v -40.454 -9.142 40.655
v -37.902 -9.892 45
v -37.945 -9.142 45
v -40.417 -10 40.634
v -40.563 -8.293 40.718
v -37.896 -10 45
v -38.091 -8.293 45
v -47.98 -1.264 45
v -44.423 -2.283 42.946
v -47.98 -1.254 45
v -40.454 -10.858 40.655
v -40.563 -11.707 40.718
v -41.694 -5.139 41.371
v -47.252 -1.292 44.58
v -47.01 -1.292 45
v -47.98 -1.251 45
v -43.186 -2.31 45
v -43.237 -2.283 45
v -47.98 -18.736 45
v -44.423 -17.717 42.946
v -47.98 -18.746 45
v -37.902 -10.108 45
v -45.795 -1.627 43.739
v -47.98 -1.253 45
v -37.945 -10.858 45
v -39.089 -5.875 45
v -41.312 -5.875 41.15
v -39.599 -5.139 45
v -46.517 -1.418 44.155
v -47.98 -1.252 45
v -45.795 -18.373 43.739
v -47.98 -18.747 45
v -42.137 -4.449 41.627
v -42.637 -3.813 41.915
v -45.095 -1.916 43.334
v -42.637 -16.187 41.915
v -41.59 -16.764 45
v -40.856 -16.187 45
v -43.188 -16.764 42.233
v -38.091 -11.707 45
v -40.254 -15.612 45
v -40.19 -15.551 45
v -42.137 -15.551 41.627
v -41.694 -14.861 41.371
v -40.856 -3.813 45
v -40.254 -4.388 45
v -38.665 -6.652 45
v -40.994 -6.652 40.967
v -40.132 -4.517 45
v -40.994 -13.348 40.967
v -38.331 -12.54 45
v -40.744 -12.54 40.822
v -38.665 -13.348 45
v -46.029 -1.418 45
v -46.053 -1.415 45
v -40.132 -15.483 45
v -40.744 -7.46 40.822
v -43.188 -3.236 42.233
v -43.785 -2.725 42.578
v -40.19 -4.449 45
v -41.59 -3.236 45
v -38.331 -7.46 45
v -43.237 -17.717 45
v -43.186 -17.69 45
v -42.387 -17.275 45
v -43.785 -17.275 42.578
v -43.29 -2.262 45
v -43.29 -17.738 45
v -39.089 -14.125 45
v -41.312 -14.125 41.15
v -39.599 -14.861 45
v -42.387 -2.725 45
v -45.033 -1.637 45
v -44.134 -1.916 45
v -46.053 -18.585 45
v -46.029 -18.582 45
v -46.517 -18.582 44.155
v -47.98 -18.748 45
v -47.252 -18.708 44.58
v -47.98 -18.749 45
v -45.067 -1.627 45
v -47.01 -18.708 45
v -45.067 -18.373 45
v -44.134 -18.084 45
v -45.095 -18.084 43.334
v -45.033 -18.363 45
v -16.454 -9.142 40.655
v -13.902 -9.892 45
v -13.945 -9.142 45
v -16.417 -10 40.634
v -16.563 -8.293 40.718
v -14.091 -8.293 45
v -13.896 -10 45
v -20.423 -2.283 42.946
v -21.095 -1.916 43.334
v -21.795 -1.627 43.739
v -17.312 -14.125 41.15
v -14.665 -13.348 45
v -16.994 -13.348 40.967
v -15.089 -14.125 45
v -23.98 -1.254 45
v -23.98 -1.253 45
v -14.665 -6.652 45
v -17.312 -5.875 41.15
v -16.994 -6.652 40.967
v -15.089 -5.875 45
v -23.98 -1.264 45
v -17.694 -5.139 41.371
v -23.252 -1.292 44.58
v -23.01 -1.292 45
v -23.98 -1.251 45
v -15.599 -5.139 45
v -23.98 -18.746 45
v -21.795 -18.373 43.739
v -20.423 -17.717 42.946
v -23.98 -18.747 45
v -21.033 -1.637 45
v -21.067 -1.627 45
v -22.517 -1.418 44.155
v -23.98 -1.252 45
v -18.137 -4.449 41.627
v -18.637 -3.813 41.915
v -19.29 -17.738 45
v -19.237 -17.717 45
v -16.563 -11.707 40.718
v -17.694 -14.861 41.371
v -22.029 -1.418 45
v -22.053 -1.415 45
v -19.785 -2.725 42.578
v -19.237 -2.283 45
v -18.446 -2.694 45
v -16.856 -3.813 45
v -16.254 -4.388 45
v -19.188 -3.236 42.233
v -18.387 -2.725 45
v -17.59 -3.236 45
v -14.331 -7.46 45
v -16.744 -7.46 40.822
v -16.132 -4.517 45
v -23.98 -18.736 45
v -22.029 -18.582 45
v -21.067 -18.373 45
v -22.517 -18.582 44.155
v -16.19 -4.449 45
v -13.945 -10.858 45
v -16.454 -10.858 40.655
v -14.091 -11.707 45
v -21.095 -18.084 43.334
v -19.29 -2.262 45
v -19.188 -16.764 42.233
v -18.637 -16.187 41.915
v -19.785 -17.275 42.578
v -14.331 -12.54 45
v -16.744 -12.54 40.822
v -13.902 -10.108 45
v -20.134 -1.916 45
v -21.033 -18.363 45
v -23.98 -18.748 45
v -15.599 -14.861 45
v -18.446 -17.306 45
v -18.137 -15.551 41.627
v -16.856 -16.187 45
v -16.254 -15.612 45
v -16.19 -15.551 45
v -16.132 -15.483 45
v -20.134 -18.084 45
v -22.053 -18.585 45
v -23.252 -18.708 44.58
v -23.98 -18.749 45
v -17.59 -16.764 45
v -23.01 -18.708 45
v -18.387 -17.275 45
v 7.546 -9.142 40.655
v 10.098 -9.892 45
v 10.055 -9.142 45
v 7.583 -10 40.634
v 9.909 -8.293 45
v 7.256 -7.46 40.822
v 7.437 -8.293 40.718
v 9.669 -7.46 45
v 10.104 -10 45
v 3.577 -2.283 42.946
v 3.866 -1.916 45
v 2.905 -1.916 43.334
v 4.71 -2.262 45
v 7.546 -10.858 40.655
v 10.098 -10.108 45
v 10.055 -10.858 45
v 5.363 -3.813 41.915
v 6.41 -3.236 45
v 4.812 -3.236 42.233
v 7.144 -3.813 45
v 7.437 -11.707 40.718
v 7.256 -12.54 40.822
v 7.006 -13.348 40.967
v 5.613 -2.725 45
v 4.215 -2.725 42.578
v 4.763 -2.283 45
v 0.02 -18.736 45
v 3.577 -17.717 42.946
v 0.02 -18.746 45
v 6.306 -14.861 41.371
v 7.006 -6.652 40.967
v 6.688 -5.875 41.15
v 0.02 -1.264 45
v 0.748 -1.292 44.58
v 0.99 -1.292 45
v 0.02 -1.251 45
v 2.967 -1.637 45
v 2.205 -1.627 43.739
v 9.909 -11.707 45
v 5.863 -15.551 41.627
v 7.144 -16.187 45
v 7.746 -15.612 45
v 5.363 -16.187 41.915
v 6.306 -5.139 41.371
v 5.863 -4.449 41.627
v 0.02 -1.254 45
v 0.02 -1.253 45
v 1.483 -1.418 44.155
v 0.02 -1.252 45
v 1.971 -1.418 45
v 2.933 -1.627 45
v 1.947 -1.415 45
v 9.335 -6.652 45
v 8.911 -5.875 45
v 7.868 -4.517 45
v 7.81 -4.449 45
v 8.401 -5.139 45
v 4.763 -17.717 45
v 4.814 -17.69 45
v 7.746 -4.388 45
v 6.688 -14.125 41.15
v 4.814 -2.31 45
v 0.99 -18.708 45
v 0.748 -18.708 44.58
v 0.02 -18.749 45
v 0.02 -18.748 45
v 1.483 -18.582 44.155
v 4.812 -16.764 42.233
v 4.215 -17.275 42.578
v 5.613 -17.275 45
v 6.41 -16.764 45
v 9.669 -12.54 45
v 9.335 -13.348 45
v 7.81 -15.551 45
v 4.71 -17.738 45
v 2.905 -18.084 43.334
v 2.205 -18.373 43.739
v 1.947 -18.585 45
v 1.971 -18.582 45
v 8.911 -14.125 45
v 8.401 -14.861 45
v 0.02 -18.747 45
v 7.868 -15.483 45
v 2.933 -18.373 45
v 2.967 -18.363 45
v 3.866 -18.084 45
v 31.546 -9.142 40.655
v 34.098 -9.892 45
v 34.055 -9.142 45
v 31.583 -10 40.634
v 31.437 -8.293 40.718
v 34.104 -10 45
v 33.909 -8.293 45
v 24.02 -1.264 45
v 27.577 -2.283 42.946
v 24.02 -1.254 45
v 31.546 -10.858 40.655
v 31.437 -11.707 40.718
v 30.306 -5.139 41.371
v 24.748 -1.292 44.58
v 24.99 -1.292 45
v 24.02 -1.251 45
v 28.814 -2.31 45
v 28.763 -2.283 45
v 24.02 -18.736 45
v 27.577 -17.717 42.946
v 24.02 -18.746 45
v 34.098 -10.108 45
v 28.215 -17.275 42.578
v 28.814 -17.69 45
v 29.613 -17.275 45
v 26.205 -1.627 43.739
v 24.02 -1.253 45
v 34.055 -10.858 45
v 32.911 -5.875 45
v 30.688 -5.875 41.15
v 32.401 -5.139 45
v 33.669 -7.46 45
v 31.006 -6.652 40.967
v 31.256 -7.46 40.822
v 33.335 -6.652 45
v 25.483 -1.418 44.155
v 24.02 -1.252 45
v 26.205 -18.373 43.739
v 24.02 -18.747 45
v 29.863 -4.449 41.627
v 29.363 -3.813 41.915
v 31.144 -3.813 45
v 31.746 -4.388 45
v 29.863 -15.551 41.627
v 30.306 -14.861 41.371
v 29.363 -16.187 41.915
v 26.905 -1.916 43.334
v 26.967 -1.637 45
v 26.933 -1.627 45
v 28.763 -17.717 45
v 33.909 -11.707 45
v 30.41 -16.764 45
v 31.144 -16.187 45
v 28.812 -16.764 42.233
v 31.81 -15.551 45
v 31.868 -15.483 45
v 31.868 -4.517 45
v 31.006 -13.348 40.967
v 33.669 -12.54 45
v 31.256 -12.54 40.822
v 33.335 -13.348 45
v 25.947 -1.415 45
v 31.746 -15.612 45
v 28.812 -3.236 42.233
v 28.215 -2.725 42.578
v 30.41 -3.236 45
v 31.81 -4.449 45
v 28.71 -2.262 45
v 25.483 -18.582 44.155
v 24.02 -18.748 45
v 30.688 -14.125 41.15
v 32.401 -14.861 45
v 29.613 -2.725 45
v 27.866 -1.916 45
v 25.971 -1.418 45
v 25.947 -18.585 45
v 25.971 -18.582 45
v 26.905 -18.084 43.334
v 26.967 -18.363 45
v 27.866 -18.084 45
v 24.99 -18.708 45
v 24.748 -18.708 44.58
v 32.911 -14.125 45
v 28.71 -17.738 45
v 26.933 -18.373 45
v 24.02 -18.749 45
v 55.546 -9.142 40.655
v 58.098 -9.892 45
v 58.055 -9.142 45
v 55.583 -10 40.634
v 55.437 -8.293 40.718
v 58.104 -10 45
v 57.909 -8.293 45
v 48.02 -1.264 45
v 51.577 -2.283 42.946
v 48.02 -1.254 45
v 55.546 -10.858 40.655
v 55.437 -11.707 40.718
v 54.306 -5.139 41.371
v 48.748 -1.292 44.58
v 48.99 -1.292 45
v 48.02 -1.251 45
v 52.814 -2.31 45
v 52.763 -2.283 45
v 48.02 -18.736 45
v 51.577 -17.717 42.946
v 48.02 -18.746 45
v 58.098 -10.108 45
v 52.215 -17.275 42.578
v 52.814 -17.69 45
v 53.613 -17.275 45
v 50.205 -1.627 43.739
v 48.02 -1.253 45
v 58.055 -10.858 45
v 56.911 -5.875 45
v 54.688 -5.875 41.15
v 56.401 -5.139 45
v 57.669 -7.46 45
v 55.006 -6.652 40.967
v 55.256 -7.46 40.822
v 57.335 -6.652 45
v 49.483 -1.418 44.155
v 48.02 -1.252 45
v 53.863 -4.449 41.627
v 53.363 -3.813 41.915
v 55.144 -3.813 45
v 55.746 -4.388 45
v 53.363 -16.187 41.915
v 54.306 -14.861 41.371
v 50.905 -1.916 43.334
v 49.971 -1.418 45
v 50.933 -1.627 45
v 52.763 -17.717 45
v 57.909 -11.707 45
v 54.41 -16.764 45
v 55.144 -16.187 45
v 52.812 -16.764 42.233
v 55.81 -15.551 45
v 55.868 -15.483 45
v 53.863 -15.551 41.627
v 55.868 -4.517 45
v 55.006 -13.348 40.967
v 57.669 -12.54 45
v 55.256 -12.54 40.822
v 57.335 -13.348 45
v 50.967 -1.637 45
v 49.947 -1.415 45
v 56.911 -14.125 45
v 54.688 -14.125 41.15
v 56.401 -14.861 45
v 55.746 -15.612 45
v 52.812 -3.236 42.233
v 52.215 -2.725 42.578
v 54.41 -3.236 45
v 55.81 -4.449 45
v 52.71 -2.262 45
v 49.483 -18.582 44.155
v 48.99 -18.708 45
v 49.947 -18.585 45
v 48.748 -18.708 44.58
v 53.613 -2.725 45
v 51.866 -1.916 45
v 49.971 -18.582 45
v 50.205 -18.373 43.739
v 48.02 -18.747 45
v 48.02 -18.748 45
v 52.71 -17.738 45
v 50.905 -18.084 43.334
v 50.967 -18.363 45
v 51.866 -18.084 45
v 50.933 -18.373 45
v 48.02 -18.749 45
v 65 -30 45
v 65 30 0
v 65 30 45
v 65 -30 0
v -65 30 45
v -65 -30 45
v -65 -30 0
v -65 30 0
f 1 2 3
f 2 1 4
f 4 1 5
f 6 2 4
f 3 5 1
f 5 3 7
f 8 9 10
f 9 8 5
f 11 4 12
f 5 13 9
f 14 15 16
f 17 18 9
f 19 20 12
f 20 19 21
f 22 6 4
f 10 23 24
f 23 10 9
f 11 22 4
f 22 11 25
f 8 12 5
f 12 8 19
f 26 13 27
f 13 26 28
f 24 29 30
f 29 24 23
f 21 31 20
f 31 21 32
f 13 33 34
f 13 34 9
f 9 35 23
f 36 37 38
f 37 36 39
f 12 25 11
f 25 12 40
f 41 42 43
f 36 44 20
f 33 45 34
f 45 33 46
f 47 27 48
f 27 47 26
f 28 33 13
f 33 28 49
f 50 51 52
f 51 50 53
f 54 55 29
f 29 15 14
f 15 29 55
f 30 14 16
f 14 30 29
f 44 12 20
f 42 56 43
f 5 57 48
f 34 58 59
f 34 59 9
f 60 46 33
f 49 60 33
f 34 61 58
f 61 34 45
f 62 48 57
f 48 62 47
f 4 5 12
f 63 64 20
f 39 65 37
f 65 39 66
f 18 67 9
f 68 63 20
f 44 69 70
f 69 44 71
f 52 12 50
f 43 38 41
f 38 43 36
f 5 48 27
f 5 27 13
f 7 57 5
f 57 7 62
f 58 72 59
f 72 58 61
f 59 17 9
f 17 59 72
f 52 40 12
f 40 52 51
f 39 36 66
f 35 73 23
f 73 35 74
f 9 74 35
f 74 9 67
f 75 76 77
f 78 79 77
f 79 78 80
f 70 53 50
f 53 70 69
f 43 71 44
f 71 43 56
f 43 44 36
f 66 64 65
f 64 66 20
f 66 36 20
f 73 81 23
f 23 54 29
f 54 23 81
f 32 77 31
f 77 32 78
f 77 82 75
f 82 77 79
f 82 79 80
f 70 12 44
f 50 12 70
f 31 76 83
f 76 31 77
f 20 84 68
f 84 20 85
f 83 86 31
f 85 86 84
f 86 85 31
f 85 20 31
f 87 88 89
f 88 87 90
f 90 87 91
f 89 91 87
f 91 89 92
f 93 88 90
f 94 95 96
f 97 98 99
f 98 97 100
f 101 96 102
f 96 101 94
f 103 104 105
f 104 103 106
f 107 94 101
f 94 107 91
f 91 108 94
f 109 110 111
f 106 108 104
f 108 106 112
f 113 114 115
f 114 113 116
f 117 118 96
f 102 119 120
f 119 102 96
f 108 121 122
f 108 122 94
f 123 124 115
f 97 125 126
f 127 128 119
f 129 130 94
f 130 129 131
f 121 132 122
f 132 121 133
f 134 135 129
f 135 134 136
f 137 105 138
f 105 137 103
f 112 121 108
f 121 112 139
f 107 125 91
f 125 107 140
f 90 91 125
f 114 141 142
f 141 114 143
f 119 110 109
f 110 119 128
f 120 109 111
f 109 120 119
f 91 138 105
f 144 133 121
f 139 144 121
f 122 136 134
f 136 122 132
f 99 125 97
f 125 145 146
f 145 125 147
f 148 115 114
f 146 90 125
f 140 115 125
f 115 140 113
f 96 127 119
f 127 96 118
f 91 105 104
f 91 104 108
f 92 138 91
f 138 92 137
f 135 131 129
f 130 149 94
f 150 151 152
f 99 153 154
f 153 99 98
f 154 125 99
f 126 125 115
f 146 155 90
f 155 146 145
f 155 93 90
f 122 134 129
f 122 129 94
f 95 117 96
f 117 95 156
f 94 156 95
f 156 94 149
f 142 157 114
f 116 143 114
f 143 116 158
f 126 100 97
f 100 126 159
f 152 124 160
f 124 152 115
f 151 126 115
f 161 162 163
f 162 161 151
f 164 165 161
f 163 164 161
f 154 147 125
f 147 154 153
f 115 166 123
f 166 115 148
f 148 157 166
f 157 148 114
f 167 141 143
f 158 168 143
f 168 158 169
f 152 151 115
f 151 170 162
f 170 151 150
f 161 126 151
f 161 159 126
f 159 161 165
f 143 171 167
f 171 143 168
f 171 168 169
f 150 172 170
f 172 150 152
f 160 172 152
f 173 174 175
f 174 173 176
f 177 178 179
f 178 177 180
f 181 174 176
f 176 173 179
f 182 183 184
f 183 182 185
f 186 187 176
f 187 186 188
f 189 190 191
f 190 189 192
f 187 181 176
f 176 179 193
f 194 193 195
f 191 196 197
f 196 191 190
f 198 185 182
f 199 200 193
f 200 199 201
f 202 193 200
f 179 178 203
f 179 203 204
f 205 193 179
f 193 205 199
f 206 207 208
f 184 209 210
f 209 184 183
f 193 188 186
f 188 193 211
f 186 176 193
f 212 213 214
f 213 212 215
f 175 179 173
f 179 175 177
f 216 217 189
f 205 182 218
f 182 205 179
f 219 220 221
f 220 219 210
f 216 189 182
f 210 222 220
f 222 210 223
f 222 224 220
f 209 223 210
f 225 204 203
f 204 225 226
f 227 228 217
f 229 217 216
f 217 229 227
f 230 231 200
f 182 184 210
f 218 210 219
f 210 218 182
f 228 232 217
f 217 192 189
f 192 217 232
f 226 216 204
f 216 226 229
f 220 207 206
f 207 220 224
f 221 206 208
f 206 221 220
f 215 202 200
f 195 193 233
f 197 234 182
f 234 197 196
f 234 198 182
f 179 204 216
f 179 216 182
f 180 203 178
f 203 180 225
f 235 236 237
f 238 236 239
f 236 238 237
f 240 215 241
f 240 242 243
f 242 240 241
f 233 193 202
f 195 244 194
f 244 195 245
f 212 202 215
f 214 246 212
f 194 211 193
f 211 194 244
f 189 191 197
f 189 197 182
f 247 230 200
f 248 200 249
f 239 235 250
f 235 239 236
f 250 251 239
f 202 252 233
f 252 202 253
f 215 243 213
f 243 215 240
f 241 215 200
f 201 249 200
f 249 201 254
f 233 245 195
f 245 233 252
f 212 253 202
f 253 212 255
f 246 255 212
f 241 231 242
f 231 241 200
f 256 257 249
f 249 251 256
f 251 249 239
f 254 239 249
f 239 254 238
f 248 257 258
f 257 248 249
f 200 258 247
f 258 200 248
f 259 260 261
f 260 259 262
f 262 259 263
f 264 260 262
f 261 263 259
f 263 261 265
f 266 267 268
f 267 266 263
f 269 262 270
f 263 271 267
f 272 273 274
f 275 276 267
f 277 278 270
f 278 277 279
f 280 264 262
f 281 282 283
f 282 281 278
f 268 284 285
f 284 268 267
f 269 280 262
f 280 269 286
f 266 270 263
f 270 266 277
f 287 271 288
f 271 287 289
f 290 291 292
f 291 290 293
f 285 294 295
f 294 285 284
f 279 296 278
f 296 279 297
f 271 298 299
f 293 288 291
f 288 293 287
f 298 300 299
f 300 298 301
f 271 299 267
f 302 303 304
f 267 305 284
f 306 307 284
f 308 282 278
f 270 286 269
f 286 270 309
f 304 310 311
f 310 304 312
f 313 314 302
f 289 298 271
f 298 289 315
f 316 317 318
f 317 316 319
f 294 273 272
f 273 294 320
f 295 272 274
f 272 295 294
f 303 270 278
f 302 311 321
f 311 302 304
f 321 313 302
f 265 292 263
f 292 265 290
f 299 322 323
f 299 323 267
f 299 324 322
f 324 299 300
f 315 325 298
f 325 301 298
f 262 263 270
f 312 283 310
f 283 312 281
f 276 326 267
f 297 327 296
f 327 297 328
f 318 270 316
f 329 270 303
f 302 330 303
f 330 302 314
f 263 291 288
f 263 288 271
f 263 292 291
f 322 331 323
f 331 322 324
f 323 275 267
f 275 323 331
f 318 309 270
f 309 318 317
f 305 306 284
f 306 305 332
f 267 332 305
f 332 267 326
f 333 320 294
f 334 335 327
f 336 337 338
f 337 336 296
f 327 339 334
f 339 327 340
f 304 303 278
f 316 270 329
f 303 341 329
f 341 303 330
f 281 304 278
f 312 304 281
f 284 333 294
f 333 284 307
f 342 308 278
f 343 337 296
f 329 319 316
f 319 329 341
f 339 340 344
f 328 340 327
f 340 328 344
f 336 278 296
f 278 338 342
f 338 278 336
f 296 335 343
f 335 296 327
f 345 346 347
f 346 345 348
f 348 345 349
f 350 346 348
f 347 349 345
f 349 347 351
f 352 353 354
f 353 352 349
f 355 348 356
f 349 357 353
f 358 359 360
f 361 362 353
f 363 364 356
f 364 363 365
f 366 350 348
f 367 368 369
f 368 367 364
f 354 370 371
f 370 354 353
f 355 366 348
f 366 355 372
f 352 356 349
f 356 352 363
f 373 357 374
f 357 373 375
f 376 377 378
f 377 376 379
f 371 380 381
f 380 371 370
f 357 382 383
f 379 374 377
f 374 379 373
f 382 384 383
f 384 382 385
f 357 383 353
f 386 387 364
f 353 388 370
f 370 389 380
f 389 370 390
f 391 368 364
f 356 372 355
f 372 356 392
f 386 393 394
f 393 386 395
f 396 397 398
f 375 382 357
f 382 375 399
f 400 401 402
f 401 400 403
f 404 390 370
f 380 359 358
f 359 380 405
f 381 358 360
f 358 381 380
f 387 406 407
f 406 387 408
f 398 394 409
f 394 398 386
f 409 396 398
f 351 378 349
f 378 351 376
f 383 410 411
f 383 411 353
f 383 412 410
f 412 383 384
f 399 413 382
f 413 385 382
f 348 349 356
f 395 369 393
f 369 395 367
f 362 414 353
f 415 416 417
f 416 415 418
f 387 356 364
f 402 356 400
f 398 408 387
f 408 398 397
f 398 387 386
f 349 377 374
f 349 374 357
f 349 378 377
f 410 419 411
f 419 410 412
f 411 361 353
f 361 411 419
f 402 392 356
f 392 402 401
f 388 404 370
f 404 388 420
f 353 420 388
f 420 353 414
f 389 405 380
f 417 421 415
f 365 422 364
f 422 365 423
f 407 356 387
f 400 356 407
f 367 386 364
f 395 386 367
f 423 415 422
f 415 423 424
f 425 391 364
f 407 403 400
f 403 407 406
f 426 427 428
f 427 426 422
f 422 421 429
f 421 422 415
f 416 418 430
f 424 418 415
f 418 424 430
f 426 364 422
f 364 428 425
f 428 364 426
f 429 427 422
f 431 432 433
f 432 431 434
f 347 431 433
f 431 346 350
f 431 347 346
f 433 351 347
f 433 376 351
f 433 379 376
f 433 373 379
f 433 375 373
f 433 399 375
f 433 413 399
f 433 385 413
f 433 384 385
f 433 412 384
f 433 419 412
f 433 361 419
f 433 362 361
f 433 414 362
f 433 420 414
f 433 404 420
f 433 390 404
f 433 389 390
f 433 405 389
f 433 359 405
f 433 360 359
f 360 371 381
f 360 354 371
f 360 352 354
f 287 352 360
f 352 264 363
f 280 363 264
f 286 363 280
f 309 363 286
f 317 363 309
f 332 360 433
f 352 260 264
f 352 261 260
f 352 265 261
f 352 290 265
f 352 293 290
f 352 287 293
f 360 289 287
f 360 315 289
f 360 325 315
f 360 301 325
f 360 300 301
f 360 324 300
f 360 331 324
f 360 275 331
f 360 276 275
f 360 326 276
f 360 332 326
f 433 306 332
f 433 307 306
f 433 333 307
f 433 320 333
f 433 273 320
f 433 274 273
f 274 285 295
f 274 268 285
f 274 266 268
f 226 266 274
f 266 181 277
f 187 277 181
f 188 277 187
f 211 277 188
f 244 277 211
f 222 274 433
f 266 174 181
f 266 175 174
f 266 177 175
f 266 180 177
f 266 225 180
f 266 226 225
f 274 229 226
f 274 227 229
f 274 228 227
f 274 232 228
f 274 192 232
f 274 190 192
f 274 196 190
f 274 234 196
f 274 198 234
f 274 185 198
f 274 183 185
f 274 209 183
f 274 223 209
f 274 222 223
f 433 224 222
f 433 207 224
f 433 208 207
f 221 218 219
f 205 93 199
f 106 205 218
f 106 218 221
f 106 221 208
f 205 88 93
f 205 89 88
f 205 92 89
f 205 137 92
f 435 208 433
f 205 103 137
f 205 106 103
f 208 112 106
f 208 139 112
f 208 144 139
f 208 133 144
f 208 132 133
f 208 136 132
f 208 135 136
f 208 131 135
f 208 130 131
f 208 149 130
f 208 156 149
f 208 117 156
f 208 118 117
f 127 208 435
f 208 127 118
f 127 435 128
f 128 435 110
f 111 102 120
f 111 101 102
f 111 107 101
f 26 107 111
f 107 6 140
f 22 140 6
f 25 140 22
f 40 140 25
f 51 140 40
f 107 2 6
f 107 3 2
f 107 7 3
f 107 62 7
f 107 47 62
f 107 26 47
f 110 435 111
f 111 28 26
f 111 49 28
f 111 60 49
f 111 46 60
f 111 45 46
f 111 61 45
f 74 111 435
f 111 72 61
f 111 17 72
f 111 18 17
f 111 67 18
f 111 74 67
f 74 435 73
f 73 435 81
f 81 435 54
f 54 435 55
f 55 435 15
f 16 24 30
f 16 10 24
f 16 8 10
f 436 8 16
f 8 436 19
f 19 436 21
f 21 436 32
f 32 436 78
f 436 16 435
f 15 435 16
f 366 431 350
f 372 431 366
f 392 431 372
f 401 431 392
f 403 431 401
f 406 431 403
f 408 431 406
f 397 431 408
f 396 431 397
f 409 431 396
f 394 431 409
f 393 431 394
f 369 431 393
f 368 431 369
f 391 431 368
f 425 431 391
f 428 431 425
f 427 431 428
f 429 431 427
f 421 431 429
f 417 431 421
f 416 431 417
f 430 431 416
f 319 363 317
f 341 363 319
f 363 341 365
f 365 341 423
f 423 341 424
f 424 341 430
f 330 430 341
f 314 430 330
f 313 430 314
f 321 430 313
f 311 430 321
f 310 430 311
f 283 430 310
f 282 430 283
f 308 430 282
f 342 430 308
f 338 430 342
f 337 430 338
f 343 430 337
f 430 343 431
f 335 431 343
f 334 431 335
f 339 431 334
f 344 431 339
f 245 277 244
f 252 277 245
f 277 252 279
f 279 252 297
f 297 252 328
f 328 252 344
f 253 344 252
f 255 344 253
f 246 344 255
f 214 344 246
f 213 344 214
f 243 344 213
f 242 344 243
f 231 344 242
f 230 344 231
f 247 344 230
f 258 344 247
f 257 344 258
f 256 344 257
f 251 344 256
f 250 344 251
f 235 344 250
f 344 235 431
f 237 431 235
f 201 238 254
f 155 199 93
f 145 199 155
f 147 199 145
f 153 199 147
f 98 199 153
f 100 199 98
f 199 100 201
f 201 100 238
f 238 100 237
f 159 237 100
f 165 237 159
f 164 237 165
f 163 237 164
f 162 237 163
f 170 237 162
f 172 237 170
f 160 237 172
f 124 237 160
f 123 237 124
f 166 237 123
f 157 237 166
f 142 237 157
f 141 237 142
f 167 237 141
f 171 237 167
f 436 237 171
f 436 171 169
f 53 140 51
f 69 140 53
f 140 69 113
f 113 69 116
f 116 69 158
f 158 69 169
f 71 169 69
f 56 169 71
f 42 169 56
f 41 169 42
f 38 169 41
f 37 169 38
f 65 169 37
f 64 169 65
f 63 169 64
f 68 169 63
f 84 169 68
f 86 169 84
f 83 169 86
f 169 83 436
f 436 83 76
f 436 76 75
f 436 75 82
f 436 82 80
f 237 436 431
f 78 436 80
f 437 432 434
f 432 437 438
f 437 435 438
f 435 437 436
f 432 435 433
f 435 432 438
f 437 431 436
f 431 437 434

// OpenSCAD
// 15mL Conical Tube Rack
// Designed for volume reading and pipetting.
// Features 5 tilted holes at 30 degrees from vertical.

// --- Dimensions ---
L = 130;             // Length of block (X)
W = 60;              // Depth of block (Y)
H = 45;              // Height of block (Z)

num_holes = 5;       // Number of tube holes
spacing = 24;        // Spacing between hole centers (X)
hole_d = 17.5;       // Diameter of the holes
hole_depth = 40;     // Depth of the holes along their axis

tilt_angle = 30;     // Tilt angle from vertical (Z-axis)
tilt_offset_y = -10; // Y-offset of the hole entry point from the center of the block

$fn = 64;

// --- Calculations ---
// The holes are tilted in the YZ plane. 
// "Tilted 30 degrees from vertical" means the axis vector is [0, sin(30), -cos(30)] 
// if we consider Z as vertical and Y as depth.
// However, the prompt says "going down into the block, it moves toward +Y".
// This means the axis vector is [0, sin(30), -cos(30)] relative to the Z axis.
// Let's define the rotation: rotate around X axis.
// A vertical line is [0, 0, -1]. Rotating it 30 deg around X moves it towards +Y.
// New vector: [0, sin(30), -cos(30)].

// Calculate the X positions for the holes (centered on the block)
// For n=5, spacing=24: indices are -2, -1, 0, 1, 2.
// Positions: -2*24, -1*24, 0, 1*24, 2*24 -> -48, -24, 0, 24, 48.
hole_x_positions = [for (i = [0 : num_holes - 1]) (i - (num_holes - 1) / 2) * spacing];

// The entry point on the top face (Z = H)
// The prompt says "Each axis meets the top face at y = -10".
// This is slightly ambiguous: does it mean the center of the hole is at Y = -10? 
// Or the hole is offset by -10? 
// "Each axis meets the top face at y = -10" implies the coordinate Y = -10.
// However, usually, a rack is centered. If all holes meet at Y = -10, they aren't spread in Y.
// Re-reading: "Each axis meets the top face at y = -10". 
// This implies the entry point for every hole is at Y = -10.
// But the block is 60mm deep (Y from -30 to +30).
// If the holes are tilted towards +Y, they move from Y = -10 towards Y = +something.
entry_y = -10; 

module hole_shape() {
    // We create a cylinder and rotate it.
    // To ensure it cuts cleanly through the top, we translate it up.
    rotate([0, tilt_angle, 0]) 
    cylinder(h = hole_depth, d = hole_d);
}

// --- Main Construction ---

difference() {
    // The main block
    // Centered on X and Y, sits on Z=0.
    translate([-L/2, -W/2, 0])
    cube([L, W, H]);

    // The holes
    for (x_pos = hole_x_positions) {
        // The axis meets the top face (Z=H) at (x_pos, entry_y, H)
        // We translate the hole to the entry point.
        // Since the cylinder is created from Z=0 upwards, we must translate it 
        // so its base is at the top face and then rotate.
        // A better way: translate to entry point, rotate, then translate down to compensate.
        
        translate([x_pos, entry_y, H])
        rotate([0, tilt_angle, 0])
        translate([0, 0, 0.01]) // Small overlap to ensure clean cut
        cylinder(h = hole_depth + 0.01, d = hole_d);
    }
}

// Note on "Flat end square to the axis": 
// A standard cylinder in OpenSCAD has a flat end. 
// By using a cylinder for the subtraction, the bottom of the hole is flat 
// and perpendicular to the axis of the hole.
